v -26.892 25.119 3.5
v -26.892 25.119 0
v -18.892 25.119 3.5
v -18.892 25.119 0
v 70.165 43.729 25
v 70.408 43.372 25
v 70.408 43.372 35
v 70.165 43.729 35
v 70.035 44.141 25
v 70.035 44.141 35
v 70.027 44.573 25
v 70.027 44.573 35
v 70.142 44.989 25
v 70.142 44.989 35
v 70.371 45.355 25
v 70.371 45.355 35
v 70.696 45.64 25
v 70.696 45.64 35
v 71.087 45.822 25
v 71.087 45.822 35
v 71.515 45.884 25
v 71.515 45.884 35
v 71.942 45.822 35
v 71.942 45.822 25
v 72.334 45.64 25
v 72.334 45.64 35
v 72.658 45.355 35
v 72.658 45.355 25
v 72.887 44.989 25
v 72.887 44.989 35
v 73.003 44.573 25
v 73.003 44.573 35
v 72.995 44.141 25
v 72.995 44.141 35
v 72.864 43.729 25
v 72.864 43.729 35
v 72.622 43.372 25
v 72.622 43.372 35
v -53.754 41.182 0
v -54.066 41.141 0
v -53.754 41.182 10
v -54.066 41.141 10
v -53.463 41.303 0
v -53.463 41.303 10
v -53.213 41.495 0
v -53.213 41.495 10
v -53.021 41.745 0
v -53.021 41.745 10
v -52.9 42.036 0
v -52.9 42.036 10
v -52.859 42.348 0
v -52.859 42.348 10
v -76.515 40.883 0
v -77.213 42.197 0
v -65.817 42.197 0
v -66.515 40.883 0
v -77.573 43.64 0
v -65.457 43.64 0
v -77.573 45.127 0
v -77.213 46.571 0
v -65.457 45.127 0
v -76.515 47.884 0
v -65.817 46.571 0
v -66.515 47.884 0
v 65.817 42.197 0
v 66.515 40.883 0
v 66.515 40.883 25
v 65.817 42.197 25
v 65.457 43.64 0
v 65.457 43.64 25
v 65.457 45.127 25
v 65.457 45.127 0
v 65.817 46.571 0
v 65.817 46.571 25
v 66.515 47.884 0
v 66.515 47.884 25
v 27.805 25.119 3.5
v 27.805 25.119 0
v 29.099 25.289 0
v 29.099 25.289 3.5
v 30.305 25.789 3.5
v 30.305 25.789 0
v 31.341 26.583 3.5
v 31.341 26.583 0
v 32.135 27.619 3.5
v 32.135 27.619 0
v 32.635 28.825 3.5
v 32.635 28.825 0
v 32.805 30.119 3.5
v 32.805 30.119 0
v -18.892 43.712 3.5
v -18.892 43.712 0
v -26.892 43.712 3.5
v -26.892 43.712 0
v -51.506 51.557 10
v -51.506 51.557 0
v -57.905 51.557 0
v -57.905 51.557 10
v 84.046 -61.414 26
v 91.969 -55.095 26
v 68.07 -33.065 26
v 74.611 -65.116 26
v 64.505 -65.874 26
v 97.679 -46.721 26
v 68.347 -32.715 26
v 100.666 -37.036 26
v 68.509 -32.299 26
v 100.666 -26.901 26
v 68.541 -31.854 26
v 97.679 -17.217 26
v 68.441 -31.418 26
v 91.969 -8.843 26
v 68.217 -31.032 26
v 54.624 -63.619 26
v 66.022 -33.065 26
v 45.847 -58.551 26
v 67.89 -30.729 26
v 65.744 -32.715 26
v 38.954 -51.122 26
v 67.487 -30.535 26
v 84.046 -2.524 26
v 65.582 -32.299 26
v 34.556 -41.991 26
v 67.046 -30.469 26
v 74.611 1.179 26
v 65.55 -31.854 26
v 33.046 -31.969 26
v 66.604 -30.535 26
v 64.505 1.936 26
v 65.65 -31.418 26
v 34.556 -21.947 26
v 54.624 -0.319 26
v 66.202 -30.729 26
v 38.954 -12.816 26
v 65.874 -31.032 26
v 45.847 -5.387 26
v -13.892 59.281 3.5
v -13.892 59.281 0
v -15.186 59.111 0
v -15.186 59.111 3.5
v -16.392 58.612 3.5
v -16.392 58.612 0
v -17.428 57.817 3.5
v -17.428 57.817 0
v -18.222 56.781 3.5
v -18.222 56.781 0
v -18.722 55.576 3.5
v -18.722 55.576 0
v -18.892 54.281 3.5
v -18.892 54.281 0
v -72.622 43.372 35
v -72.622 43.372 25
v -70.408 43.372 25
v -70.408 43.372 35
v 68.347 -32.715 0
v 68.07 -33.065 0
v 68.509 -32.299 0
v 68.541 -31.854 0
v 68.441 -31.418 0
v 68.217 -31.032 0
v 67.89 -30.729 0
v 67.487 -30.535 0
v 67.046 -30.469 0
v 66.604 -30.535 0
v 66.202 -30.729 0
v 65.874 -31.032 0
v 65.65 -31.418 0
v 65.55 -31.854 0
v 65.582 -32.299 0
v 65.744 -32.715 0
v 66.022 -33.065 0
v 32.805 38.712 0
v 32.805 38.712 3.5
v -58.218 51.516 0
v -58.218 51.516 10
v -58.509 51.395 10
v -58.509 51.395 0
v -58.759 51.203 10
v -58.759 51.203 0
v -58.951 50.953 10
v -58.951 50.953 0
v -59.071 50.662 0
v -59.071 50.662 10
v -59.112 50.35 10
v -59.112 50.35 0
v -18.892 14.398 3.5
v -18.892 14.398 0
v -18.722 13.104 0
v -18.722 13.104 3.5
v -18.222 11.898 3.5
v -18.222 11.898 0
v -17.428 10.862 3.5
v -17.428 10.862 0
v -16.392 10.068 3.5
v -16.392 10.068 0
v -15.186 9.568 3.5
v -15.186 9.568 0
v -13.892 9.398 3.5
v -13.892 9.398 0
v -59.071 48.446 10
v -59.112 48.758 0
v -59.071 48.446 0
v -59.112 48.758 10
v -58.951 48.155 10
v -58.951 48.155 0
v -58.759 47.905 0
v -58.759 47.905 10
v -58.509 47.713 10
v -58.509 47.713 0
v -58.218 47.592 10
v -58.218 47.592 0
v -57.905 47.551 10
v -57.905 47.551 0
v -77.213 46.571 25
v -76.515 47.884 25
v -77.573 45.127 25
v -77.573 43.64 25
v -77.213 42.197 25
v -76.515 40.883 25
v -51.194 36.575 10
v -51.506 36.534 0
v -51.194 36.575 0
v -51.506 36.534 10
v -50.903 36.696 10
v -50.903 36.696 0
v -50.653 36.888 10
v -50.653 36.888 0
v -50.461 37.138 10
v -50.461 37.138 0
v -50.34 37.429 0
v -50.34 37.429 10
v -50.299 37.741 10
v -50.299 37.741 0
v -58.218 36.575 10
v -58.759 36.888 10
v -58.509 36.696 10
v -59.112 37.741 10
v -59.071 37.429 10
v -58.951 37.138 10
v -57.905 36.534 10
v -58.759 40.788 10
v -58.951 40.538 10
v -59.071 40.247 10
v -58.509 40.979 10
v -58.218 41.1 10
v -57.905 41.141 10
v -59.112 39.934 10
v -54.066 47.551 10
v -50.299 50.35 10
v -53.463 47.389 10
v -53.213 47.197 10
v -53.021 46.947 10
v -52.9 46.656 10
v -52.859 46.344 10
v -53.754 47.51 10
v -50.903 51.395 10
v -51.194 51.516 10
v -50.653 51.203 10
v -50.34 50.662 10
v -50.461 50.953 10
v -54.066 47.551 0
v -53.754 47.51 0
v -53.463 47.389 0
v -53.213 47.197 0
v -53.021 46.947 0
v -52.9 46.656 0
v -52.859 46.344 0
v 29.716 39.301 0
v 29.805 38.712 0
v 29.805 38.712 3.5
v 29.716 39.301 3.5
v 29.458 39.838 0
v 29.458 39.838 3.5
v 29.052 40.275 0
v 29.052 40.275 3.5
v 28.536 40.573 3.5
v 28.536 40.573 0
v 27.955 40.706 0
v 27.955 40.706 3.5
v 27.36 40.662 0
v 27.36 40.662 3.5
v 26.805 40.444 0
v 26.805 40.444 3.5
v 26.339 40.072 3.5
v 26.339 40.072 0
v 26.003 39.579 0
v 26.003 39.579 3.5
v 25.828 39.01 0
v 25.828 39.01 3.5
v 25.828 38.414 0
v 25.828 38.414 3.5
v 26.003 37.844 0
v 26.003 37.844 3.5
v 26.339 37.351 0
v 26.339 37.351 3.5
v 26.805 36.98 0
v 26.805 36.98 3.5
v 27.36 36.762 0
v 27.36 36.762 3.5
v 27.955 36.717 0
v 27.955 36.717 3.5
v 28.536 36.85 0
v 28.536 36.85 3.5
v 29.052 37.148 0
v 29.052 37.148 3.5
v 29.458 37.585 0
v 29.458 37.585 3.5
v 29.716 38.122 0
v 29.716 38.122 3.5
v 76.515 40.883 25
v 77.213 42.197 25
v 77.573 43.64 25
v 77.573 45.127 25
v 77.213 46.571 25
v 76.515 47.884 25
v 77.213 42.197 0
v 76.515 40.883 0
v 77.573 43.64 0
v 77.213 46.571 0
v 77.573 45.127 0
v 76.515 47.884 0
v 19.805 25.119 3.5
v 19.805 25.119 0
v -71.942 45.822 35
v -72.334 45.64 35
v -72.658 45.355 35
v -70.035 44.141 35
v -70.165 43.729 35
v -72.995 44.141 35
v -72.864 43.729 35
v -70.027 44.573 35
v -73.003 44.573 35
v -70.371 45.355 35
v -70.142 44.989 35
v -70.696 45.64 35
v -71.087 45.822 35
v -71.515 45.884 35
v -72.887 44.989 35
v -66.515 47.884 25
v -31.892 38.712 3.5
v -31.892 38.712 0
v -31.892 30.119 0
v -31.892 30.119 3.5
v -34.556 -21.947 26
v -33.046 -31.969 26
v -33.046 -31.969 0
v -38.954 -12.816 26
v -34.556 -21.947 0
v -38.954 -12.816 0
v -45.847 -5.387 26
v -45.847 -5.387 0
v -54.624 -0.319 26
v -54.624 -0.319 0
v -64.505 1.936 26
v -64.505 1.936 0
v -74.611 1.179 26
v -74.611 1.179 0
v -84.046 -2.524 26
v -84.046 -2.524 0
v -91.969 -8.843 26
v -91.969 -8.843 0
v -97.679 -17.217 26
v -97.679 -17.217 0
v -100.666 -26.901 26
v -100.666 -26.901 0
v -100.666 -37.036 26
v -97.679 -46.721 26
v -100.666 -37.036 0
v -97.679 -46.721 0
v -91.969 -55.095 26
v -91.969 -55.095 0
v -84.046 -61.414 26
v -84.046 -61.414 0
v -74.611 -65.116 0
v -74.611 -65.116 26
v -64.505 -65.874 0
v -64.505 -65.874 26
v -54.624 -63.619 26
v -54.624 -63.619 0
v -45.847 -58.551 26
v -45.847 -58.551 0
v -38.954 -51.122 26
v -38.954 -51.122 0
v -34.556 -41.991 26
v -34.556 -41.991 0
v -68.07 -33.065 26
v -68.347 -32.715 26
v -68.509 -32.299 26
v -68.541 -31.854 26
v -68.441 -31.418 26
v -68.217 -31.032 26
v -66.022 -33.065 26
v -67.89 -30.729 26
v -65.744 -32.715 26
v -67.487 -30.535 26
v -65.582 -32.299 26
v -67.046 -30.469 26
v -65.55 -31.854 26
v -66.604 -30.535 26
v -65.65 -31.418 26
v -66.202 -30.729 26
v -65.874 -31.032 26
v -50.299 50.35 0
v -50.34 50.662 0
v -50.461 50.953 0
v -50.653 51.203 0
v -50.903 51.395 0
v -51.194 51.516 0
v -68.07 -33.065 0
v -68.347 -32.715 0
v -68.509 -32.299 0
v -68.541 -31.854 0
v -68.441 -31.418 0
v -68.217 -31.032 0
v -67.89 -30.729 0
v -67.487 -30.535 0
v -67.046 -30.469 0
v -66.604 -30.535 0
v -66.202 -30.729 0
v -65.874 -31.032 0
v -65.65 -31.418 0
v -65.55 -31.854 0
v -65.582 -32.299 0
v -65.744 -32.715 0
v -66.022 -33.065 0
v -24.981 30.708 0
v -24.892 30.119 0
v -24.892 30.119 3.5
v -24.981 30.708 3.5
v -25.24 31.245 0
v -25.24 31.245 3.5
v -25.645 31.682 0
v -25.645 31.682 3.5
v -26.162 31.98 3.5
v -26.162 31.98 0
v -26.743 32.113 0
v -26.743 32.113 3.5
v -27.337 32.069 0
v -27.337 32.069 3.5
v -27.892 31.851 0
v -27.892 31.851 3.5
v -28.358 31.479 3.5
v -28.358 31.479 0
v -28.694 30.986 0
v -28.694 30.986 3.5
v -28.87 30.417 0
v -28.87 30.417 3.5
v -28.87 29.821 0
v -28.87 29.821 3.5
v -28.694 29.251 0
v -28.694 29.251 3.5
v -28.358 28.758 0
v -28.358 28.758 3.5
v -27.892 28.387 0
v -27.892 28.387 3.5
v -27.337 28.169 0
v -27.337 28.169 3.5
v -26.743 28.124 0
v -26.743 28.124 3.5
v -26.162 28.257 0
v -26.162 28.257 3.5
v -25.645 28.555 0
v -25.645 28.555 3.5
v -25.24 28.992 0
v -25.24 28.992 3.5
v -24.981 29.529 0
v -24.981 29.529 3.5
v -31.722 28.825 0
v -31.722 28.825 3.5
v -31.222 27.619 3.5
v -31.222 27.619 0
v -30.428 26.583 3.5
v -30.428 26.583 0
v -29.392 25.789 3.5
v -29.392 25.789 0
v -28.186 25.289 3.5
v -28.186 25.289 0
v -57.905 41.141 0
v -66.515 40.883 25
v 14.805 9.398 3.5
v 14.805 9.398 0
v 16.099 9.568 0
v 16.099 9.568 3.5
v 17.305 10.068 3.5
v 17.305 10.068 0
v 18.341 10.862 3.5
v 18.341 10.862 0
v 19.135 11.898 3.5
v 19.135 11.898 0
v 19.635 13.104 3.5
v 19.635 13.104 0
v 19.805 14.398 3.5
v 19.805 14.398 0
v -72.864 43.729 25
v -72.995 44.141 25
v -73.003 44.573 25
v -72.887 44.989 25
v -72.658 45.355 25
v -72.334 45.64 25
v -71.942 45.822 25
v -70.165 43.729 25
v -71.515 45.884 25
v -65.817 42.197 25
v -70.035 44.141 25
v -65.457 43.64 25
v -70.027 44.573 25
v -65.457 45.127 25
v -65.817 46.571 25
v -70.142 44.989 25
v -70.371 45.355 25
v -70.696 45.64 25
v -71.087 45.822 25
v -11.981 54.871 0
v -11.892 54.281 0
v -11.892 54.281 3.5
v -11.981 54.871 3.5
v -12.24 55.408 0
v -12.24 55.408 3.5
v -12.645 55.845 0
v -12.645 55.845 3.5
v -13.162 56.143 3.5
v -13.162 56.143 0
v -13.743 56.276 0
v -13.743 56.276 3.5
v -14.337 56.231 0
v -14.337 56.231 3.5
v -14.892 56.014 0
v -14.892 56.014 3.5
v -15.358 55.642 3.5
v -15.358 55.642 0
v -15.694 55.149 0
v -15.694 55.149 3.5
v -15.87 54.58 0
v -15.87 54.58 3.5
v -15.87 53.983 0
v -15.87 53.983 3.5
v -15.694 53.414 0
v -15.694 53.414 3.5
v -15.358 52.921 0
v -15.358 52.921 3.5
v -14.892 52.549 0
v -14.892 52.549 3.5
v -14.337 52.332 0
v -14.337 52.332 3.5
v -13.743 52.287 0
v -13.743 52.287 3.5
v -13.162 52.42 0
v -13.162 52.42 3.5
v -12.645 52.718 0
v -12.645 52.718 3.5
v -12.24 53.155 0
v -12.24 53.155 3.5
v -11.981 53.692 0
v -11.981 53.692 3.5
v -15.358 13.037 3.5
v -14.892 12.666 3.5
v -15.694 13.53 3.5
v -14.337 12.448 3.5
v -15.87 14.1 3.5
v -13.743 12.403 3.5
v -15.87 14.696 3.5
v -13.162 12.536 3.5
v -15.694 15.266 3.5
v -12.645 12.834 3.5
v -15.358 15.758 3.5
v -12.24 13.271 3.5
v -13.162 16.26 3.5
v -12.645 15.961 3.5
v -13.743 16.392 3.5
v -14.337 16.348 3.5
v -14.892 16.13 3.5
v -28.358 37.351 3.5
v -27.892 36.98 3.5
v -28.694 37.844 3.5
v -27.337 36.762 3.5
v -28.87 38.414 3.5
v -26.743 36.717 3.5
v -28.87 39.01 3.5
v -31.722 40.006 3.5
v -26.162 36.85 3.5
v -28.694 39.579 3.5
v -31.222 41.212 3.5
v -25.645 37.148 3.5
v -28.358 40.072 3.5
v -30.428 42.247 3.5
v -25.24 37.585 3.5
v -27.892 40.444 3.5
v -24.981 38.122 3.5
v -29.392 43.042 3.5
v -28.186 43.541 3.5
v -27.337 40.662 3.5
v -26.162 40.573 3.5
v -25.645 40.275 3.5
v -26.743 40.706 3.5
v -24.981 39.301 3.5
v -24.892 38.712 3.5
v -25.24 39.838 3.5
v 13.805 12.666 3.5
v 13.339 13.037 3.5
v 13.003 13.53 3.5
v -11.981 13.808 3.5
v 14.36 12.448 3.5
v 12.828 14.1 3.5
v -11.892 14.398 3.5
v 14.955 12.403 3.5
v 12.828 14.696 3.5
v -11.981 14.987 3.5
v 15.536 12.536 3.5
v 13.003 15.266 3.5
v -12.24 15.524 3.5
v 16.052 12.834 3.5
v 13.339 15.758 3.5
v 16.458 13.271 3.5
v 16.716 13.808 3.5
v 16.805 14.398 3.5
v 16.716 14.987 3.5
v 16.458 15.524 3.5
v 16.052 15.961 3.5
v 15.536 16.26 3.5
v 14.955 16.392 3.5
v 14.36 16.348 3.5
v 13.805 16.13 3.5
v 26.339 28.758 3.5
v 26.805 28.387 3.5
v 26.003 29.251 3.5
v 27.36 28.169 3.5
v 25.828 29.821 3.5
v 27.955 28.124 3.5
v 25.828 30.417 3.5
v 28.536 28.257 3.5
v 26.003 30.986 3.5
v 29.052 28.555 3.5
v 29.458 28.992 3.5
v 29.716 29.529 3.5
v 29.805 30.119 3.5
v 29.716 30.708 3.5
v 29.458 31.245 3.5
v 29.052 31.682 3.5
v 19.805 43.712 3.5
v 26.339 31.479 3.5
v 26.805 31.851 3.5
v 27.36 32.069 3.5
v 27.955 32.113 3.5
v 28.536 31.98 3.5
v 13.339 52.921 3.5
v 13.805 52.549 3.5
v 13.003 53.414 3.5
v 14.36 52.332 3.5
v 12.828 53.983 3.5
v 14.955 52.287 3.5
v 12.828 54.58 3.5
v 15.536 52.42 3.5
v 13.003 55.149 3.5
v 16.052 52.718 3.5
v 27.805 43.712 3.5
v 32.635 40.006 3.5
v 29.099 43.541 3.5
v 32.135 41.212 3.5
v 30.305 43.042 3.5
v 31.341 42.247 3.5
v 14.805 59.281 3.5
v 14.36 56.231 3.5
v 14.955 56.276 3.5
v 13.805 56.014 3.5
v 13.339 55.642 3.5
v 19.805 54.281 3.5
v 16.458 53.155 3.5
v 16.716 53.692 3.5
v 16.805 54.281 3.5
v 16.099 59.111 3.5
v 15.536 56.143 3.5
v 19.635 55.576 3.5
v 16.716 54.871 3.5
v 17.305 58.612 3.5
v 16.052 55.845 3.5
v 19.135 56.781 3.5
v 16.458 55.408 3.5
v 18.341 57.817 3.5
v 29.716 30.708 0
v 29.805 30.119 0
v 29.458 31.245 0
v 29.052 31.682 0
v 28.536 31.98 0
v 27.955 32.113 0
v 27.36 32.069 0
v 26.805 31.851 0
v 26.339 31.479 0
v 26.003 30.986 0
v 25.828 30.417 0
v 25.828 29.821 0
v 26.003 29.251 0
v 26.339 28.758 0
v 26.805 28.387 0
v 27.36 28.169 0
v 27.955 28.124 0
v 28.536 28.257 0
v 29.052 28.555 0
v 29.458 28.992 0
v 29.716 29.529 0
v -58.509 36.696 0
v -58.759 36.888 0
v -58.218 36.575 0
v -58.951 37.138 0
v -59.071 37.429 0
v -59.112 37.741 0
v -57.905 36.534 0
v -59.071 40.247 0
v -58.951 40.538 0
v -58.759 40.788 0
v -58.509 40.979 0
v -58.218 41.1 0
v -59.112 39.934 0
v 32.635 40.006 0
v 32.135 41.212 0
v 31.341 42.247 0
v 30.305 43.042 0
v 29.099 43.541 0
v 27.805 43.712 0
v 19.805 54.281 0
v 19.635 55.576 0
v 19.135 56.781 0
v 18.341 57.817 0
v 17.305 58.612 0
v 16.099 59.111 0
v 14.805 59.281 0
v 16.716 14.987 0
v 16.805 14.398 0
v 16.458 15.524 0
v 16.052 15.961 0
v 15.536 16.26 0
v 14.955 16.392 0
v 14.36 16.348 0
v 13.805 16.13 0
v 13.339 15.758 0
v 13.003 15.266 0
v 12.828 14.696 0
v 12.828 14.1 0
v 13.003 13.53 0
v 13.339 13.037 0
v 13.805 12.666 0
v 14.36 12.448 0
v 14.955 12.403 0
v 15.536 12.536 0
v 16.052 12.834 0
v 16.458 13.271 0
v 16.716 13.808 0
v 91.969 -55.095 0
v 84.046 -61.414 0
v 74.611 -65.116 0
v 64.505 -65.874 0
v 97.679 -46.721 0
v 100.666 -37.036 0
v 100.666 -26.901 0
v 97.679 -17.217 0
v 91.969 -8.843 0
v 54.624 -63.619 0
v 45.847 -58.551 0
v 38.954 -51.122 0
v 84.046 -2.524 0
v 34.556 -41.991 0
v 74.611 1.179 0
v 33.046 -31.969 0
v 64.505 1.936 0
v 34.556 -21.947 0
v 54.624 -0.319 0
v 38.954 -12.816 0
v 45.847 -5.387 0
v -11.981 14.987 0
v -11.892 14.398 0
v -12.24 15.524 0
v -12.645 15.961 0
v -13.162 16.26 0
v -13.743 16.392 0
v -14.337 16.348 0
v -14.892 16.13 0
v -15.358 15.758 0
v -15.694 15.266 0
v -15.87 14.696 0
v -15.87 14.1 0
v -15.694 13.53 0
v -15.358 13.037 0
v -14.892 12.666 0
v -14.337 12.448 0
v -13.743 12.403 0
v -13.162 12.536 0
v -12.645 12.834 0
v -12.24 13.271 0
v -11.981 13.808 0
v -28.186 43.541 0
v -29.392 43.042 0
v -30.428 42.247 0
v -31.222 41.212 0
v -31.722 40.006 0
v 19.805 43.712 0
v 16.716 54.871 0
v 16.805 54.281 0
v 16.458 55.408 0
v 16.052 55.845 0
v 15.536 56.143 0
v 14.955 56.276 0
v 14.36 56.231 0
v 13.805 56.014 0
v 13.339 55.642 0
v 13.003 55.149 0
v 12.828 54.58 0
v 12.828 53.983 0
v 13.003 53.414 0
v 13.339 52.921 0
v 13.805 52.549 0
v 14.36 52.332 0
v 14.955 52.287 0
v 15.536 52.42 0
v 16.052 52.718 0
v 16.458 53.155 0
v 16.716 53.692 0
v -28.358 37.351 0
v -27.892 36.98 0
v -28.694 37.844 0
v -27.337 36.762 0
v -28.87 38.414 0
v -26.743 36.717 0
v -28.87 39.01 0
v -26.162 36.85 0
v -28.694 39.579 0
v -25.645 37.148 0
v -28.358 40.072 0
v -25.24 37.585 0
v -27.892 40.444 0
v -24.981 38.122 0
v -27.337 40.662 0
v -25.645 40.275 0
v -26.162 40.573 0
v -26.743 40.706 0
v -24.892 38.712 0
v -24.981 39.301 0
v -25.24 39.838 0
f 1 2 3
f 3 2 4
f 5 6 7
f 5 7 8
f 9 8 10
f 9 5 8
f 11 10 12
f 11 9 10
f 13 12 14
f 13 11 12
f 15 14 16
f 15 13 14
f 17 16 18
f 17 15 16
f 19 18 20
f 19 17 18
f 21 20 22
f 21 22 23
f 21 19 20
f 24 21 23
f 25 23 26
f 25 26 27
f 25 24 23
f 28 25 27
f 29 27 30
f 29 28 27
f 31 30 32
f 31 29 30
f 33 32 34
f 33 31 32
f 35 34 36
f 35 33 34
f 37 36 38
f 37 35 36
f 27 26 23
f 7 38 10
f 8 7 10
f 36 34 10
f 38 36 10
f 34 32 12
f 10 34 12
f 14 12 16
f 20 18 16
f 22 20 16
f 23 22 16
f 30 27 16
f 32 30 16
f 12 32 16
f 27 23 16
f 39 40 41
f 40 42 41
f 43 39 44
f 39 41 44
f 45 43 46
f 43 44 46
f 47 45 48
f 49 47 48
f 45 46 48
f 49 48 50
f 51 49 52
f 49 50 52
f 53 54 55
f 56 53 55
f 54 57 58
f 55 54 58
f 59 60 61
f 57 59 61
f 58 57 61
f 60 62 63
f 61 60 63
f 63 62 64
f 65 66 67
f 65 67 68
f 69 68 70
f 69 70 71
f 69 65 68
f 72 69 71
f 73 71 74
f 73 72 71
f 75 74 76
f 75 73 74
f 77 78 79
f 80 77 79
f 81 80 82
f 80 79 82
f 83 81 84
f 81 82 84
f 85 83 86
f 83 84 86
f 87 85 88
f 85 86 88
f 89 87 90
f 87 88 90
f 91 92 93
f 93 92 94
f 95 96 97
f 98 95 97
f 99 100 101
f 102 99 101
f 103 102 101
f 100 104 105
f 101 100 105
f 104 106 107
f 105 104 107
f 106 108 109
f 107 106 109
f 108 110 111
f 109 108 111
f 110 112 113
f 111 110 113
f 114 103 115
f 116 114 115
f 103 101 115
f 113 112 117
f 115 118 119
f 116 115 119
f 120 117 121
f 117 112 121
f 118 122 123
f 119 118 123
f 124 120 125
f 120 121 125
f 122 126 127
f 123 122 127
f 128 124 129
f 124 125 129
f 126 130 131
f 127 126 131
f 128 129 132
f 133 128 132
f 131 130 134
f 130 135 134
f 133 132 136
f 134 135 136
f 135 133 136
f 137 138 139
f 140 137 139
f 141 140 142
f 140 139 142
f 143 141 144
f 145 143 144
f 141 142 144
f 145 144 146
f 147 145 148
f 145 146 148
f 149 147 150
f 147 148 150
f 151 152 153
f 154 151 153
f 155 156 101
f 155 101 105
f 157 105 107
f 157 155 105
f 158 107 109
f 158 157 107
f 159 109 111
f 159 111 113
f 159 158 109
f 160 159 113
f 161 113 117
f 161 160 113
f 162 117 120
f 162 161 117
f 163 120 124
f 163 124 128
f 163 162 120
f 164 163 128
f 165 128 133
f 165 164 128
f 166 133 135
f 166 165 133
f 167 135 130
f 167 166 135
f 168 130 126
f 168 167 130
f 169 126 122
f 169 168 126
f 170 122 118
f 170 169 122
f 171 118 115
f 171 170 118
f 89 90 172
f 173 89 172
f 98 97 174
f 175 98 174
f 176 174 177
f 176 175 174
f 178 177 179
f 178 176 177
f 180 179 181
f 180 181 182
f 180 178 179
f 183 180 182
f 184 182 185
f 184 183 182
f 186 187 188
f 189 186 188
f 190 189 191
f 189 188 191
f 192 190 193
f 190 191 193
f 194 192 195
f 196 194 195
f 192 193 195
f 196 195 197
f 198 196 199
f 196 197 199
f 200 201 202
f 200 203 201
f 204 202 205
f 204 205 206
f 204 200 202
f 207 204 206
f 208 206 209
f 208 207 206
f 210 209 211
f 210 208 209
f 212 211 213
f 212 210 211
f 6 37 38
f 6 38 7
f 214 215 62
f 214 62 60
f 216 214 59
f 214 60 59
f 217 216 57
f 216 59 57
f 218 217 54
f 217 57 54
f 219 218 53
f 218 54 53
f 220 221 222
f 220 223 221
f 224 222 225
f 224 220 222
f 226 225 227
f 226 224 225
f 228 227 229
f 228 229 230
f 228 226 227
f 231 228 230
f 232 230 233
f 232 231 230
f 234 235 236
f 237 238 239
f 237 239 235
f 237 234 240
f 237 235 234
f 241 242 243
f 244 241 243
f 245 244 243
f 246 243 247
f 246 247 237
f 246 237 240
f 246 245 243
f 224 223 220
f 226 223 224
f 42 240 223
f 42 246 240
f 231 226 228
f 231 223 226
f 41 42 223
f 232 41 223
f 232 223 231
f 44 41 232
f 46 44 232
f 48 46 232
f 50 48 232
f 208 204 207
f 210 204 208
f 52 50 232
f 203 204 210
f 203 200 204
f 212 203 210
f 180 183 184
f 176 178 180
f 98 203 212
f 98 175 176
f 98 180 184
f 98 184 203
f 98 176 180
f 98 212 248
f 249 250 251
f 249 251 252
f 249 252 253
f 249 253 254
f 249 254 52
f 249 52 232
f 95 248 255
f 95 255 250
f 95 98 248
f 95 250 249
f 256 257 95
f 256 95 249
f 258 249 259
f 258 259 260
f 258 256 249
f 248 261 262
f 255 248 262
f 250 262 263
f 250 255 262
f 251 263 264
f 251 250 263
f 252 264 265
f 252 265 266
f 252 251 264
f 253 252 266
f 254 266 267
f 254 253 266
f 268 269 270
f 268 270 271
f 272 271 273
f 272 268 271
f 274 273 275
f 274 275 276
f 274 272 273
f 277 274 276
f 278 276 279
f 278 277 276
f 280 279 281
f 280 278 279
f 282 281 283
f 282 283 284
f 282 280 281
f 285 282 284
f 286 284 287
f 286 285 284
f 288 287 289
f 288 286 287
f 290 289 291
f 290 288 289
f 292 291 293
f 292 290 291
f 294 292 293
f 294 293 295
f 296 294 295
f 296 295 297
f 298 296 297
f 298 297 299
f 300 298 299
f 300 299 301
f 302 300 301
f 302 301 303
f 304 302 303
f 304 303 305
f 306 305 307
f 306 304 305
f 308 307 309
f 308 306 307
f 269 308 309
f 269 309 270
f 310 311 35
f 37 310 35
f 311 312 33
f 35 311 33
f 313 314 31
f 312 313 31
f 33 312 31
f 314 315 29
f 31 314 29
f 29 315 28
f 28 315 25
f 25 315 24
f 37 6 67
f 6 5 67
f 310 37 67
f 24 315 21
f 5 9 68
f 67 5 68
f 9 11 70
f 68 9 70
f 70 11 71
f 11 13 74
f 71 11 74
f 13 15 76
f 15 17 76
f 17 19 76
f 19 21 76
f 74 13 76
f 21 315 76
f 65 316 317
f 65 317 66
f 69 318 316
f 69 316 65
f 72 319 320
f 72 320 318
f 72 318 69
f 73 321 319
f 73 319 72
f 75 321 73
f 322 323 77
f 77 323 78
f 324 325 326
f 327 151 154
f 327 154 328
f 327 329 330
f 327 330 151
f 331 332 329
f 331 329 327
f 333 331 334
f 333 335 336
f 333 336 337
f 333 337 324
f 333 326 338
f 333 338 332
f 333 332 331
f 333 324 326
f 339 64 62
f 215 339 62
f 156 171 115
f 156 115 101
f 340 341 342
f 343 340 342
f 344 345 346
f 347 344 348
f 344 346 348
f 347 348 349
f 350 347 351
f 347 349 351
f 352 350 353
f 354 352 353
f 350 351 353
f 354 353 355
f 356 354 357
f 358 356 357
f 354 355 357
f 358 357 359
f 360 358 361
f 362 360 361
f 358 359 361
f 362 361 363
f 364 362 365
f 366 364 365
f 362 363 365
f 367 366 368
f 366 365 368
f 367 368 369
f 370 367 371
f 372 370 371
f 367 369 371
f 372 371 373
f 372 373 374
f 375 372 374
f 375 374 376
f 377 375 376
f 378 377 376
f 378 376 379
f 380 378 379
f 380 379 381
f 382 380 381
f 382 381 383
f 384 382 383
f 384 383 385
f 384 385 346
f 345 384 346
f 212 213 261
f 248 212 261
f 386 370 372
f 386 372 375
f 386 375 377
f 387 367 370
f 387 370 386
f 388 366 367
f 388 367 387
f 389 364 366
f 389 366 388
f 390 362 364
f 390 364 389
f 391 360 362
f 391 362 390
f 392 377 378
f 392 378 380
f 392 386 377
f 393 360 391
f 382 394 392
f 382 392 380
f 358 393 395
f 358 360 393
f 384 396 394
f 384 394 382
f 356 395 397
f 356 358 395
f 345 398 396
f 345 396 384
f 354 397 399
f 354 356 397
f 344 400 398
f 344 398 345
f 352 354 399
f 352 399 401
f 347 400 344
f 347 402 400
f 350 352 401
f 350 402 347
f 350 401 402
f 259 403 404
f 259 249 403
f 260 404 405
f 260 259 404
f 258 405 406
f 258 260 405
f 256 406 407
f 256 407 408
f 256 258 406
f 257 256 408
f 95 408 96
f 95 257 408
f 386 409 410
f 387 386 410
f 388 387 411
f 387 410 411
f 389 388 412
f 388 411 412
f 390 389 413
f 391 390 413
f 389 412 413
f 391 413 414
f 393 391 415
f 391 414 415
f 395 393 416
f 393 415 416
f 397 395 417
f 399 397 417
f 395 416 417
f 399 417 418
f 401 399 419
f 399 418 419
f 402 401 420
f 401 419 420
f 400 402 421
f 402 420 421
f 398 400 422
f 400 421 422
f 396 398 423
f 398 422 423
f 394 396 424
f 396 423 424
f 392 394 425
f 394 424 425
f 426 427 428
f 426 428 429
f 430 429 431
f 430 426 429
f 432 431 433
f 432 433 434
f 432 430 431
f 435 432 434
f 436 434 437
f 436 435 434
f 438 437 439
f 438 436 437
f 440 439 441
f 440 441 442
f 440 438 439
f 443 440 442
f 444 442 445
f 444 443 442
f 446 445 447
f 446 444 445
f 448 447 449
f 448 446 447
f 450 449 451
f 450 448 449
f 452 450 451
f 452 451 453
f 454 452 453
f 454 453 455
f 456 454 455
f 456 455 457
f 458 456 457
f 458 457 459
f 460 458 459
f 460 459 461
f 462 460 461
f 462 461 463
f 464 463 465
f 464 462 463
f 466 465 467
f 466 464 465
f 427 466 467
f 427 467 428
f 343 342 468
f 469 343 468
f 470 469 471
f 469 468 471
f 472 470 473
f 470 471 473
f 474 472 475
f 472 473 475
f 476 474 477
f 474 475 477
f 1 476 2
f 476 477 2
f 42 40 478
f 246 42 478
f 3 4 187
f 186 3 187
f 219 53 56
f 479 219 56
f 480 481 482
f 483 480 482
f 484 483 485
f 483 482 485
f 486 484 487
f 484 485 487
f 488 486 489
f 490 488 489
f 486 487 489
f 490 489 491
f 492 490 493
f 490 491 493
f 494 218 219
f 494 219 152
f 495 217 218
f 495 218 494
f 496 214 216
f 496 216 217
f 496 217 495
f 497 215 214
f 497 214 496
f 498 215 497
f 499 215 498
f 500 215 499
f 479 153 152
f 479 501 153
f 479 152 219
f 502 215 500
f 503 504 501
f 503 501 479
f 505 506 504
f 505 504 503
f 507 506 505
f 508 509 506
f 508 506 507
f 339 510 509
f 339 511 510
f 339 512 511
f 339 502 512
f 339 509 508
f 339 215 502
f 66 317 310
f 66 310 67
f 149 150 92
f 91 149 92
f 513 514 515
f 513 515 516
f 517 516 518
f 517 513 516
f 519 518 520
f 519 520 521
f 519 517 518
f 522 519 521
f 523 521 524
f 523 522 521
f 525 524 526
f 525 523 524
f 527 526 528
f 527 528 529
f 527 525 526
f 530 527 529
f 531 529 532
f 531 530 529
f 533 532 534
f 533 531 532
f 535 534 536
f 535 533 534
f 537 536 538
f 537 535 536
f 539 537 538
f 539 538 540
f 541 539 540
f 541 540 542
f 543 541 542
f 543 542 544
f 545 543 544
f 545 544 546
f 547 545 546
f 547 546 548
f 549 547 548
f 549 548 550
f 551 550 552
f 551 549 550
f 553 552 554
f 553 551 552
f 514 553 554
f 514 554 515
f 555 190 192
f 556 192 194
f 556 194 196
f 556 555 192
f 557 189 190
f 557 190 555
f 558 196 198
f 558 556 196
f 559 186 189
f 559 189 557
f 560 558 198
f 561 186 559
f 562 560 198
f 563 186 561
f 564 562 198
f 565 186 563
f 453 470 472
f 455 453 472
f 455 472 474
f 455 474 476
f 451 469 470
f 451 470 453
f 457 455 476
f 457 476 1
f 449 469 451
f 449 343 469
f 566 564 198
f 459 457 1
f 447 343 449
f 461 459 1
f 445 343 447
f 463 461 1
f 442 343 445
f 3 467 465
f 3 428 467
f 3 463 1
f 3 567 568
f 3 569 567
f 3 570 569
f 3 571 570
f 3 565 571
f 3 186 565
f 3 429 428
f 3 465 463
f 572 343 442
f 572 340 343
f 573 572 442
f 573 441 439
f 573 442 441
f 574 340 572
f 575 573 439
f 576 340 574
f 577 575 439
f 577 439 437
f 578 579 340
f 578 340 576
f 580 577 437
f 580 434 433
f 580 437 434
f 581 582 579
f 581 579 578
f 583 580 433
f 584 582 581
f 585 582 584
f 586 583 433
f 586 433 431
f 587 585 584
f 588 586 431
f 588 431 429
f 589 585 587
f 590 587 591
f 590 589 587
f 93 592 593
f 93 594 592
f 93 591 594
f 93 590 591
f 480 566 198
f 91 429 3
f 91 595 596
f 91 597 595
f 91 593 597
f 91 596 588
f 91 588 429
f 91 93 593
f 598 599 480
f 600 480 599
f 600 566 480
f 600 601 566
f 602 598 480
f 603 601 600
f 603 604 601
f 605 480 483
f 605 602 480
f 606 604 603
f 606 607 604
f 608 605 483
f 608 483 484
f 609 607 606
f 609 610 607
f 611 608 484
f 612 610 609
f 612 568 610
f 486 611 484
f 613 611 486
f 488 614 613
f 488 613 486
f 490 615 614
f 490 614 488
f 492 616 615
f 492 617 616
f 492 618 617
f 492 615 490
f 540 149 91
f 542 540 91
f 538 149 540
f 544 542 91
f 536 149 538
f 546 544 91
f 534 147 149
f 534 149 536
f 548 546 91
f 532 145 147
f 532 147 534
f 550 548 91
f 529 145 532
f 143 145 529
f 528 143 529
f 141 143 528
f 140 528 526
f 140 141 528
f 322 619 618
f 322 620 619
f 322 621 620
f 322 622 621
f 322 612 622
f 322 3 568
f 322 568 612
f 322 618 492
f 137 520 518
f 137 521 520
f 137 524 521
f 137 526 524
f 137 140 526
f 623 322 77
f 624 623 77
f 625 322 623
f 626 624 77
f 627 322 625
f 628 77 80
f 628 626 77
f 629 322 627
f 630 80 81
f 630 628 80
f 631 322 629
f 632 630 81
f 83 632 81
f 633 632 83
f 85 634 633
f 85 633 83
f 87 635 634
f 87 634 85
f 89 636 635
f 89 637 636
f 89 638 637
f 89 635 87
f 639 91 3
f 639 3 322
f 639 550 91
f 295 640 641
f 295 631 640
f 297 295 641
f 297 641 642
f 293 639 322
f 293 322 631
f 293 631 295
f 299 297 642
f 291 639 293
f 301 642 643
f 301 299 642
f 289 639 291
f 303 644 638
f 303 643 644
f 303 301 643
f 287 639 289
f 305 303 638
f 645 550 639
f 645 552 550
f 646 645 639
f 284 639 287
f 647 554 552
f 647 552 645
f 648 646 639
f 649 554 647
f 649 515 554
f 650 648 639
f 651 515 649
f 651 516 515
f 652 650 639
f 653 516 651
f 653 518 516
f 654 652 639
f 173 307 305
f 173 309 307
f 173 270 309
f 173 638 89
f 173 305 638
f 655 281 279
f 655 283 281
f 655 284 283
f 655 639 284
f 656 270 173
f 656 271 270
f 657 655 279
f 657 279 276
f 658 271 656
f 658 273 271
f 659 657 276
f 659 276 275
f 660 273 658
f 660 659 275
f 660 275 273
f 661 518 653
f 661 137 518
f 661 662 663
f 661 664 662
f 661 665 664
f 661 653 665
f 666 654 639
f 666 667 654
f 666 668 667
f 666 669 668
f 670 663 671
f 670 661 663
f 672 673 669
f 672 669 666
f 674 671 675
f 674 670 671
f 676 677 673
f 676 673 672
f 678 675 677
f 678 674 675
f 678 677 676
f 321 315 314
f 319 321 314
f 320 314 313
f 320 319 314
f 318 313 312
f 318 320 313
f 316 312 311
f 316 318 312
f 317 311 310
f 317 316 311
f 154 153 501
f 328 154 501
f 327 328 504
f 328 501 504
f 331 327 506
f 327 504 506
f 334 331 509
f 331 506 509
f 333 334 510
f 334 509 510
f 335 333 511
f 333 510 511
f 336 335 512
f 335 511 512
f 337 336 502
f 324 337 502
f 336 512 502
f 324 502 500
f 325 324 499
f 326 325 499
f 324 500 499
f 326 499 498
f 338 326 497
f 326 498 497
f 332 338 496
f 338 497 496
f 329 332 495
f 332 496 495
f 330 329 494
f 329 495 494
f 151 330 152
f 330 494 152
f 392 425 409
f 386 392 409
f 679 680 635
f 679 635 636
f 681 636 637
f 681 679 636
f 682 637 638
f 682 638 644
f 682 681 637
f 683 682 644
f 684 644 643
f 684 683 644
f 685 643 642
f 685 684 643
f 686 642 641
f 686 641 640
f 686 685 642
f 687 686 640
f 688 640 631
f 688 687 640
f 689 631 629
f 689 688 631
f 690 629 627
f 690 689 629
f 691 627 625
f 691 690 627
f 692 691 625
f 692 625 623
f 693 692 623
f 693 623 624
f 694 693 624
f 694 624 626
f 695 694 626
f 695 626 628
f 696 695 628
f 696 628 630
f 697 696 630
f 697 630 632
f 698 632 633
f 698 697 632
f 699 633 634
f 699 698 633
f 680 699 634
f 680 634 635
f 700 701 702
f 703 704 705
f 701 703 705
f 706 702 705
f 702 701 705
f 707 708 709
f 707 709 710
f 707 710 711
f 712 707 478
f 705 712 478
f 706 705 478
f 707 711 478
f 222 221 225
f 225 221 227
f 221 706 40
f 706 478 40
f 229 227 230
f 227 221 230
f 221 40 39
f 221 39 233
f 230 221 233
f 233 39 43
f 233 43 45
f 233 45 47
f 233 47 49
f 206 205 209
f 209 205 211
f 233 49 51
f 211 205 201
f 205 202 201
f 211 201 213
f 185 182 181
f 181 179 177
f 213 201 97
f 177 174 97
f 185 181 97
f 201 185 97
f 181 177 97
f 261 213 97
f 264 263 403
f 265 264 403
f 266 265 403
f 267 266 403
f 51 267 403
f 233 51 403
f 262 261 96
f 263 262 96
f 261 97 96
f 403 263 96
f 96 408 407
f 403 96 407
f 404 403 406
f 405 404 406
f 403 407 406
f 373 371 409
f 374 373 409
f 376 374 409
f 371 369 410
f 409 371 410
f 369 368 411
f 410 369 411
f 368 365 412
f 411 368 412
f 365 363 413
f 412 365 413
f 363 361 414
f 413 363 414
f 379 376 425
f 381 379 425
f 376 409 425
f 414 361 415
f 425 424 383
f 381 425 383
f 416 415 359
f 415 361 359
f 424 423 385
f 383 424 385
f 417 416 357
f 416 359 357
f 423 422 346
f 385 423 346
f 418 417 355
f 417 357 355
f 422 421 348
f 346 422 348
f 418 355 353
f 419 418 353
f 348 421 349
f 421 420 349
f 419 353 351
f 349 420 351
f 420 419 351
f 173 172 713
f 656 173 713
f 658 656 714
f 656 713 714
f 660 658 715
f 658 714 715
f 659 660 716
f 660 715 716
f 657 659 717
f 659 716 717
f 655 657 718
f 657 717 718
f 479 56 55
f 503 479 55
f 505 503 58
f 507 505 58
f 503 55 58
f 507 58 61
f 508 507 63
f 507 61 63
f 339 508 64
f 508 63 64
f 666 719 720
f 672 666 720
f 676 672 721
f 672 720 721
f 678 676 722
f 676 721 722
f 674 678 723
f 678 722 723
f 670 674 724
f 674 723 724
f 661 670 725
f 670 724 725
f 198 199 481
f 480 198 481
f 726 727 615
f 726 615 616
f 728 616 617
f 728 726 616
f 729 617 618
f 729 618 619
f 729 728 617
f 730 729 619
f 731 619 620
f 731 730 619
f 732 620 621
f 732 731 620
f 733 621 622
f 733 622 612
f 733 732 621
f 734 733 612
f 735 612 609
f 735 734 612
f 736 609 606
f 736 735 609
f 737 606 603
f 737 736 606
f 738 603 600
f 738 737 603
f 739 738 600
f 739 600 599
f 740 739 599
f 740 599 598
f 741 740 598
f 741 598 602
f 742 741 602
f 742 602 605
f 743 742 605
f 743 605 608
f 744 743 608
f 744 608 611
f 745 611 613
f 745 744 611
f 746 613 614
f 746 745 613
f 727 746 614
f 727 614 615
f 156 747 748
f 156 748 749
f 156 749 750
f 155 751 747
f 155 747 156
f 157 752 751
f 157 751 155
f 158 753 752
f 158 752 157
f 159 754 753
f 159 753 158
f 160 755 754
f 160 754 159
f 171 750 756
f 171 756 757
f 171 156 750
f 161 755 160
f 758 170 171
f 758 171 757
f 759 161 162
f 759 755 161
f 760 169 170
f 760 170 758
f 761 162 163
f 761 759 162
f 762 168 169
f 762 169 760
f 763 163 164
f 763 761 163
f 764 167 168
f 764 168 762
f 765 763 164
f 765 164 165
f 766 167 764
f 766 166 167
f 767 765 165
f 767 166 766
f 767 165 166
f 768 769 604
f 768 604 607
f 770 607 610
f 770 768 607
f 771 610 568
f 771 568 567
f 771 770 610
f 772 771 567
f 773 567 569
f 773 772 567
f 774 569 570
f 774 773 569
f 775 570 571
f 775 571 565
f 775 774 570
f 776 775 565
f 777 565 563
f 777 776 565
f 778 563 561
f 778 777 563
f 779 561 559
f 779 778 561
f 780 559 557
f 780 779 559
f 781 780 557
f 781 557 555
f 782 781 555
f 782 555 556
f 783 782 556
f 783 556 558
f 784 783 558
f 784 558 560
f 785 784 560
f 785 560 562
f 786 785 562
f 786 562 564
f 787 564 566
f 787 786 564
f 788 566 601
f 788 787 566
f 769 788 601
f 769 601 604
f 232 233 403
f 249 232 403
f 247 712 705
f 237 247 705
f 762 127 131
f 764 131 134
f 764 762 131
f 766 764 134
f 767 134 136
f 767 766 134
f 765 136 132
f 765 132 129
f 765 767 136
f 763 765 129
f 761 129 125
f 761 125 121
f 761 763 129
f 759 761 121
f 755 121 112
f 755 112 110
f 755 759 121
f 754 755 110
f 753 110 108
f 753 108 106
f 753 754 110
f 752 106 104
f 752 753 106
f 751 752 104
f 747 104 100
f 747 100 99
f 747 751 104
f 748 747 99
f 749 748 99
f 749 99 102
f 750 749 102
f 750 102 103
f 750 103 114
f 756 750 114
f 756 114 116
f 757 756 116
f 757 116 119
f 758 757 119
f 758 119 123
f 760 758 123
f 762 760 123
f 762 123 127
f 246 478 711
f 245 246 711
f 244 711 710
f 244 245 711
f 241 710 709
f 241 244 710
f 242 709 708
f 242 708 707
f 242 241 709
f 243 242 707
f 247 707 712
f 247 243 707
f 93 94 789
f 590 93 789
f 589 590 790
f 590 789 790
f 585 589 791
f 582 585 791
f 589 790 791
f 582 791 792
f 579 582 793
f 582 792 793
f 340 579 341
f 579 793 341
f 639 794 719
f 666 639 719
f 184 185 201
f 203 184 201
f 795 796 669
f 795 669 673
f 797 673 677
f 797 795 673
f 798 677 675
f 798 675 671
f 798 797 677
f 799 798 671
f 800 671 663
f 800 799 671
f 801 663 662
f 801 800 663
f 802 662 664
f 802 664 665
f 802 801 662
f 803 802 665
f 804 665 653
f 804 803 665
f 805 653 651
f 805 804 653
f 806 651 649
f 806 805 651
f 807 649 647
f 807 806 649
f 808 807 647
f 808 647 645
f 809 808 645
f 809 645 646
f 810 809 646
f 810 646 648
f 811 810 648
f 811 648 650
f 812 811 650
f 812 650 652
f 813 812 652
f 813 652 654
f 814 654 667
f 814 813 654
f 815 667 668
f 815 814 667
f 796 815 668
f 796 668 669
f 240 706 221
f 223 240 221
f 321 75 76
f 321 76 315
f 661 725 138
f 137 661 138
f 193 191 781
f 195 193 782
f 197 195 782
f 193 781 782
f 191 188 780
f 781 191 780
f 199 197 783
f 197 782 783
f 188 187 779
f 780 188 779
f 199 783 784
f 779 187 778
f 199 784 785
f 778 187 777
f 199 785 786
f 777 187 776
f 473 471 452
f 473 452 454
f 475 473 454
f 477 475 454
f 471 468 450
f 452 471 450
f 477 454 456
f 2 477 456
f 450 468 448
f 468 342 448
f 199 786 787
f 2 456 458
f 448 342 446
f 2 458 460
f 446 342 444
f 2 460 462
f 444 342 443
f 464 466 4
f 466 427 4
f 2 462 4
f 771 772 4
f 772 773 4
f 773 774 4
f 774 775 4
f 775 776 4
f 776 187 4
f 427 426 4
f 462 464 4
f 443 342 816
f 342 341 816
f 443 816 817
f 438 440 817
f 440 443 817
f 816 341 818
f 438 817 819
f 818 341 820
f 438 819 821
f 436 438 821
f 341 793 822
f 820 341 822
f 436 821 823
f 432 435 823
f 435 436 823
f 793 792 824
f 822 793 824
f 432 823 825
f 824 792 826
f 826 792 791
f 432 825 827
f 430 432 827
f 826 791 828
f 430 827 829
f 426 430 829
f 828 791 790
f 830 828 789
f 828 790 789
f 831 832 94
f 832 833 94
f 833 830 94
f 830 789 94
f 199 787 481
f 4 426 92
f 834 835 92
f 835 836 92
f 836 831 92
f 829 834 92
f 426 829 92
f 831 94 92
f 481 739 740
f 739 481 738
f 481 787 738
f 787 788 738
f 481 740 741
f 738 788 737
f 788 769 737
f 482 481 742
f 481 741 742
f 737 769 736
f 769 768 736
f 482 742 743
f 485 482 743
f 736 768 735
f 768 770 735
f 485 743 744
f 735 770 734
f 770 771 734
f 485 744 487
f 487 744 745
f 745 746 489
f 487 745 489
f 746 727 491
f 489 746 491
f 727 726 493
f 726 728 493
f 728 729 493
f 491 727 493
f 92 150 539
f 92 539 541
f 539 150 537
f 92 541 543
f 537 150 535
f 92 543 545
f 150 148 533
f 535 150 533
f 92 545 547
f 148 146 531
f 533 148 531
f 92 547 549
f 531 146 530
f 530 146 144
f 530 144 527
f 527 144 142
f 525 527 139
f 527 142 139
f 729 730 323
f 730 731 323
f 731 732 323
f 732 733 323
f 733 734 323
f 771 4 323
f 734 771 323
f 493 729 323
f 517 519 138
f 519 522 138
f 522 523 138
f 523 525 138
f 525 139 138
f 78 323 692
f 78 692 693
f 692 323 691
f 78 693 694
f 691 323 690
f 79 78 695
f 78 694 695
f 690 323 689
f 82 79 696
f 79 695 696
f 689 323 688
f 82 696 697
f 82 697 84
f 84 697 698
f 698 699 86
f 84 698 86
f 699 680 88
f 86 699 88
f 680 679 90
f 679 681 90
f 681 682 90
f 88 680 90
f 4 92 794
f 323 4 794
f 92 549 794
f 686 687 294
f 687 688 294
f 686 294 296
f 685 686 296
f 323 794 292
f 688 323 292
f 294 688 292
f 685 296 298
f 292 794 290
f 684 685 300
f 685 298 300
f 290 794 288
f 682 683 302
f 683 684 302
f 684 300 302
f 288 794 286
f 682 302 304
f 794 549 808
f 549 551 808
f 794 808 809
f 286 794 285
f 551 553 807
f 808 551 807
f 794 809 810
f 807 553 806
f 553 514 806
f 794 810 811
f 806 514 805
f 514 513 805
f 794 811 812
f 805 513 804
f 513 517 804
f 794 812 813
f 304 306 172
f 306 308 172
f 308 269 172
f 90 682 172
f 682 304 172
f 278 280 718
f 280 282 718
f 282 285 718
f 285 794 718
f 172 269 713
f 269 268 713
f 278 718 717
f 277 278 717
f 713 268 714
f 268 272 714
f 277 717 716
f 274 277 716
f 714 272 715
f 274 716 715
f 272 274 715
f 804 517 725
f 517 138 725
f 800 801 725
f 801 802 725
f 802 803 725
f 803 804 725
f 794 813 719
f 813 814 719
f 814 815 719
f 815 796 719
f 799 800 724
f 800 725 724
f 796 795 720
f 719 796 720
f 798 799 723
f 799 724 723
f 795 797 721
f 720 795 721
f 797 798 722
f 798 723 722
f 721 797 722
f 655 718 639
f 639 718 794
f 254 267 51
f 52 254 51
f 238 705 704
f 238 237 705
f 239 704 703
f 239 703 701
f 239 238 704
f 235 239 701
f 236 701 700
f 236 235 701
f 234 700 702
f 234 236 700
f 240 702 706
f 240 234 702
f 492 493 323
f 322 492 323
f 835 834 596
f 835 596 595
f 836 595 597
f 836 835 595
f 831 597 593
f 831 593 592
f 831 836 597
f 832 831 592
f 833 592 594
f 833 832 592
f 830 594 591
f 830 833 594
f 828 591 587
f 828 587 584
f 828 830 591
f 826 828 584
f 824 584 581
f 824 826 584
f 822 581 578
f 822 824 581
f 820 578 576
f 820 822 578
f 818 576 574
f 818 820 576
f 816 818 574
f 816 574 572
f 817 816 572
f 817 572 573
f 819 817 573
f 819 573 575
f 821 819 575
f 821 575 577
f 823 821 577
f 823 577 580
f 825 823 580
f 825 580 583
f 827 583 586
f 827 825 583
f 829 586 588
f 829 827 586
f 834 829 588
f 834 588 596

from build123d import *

# Parameters (mm, degrees)
F0_R      = 34
F1_DEPTH  = 26
F2_DEPTH  = 25
F4_DEPTH  = 25
F6_DEPTH  = 10
F9_DEPTH  = 10
F10_R     = 1.207107
F11_R     = 2
F12_DEPTH = 3.5


with BuildPart() as f1:
    # F0 (on Top) → F1 (new body)
    with BuildSketch(Plane.XY):
        with Locations((-67.045674, -31.968914)):
            Circle(F0_R)
        with BuildLine():
            ThreePointArc((-68.069792, -33.064898), (-67.045674, -30.468914), (-66.021555, -33.064898))
            Line((-66.021555, -33.064898), (-68.069792, -33.064898))
        make_face(mode=Mode.SUBTRACT)
    extrude(amount=F1_DEPTH)

    # F0 (on Top) → F2 (join)
    with BuildSketch(Plane.XY):
        with Locations((-67.045674, -31.968914)):
            Circle(F0_R)
        with BuildLine():
            ThreePointArc((-68.069792, -33.064898), (-67.045674, -30.468914), (-66.021555, -33.064898))
            Line((-66.021555, -33.064898), (-68.069792, -33.064898))
        make_face(mode=Mode.SUBTRACT)
    extrude(amount=F2_DEPTH)


with BuildPart() as f4:
    # F3 (on Top) → F4 (new body)
    with BuildSketch(Plane.XY):
        with BuildLine():
            Line((-66.514805, 47.884089), (-76.514805, 47.884089))
            ThreePointArc((-76.514805, 47.884089), (-77.618305, 44.383701), (-76.514805, 40.883314))
            Line((-76.514805, 40.883314), (-66.514805, 40.883314))
            ThreePointArc((-66.514805, 40.883314), (-65.411305, 44.383701), (-66.514805, 47.884089))
        make_face()
    extrude(amount=F4_DEPTH)

    # F5 (on face) → F6 (join)
    with BuildSketch(Plane.XY.offset(25)):
        with BuildLine():
            Line((-72.622018, 43.371733), (-70.407592, 43.371733))
            ThreePointArc((-70.407592, 43.371733), (-71.514805, 45.883701), (-72.622018, 43.371733))
        make_face()
    extrude(amount=F6_DEPTH)


with BuildPart() as f7_1:
    # F7: instance of F4
    add(f4.part.mirror(Plane.YZ))


with BuildPart() as f7_2:
    # F7: instance of F1
    add(f1.part.mirror(Plane.YZ))


with BuildPart() as f9:
    # F8 (on Top) → F9 (new body)
    with BuildSketch(Plane.XY):
        Polygon((-52.858956, 41.141208), (-59.112478, 41.141208), (-59.112478, 36.534205), (-50.299078, 36.534205), (-50.299078, 51.557045), (-59.112478, 51.557045), (-59.112478, 47.550954), (-52.858956, 47.550954), align=None)
    extrude(amount=F9_DEPTH)

    # F10
    f10_edges = [f9.edges().sort_by_distance(p)[0] for p in [
        (-59.112478, 47.550954, 5),
        (-59.112478, 41.141208, 5),
        (-52.858956, 47.550954, 5),
        (-52.858956, 41.141208, 5),
        (-50.299078, 51.557045, 5),
        (-59.112478, 51.557045, 5),
        (-50.299078, 36.534205, 5),
        (-59.112478, 36.534205, 5),
    ]]
    fillet(f10_edges, radius=F10_R)


with BuildPart() as f12:
    # F11 (on Top) → F12 (new body)
    with BuildSketch(Plane.XY):
        with BuildLine():
            ThreePointArc((-18.892364, 14.397767), (-17.427898, 10.862233), (-13.892364, 9.397767))
            Line((-13.892364, 9.397767), (14.805313, 9.397767))
            ThreePointArc((14.805313, 9.397767), (18.340847, 10.862233), (19.805313, 14.397767))
            Line((19.805313, 14.397767), (19.805313, 25.118697))
            Line((19.805313, 25.118697), (27.805313, 25.118697))
            ThreePointArc((27.805313, 25.118697), (31.340847, 26.583163), (32.805313, 30.118697))
            Line((32.805313, 30.118697), (32.805313, 38.711721))
            ThreePointArc((32.805313, 38.711721), (31.340847, 42.247255), (27.805313, 43.711721))
            Line((27.805313, 43.711721), (19.805313, 43.711721))
            Line((19.805313, 43.711721), (19.805313, 54.28149))
            ThreePointArc((19.805313, 54.28149), (18.340847, 57.817024), (14.805313, 59.28149))
            Line((14.805313, 59.28149), (-13.892364, 59.28149))
            ThreePointArc((-13.892364, 59.28149), (-17.427898, 57.817024), (-18.892364, 54.28149))
            Line((-18.892364, 54.28149), (-18.892364, 43.711721))
            Line((-18.892364, 43.711721), (-26.892364, 43.711721))
            ThreePointArc((-26.892364, 43.711721), (-30.427898, 42.247255), (-31.892364, 38.711721))
            Line((-31.892364, 38.711721), (-31.892364, 30.118697))
            ThreePointArc((-31.892364, 30.118697), (-30.427898, 26.583163), (-26.892364, 25.118697))
            Line((-26.892364, 25.118697), (-18.892364, 25.118697))
            Line((-18.892364, 25.118697), (-18.892364, 14.397767))
        make_face()
        with Locations((-13.892364, 14.397767)):
            Circle(F11_R, mode=Mode.SUBTRACT)
        with Locations((-26.892364, 30.118697)):
            Circle(F11_R, mode=Mode.SUBTRACT)
        with Locations((14.805313, 14.397767)):
            Circle(F11_R, mode=Mode.SUBTRACT)
        with Locations((27.805313, 30.118697)):
            Circle(F11_R, mode=Mode.SUBTRACT)
        with Locations((-26.892364, 38.711721)):
            Circle(F11_R, mode=Mode.SUBTRACT)
        with Locations((-13.892364, 54.28149)):
            Circle(F11_R, mode=Mode.SUBTRACT)
        with Locations((27.805313, 38.711721)):
            Circle(F11_R, mode=Mode.SUBTRACT)
        with Locations((14.805313, 54.28149)):
            Circle(F11_R, mode=Mode.SUBTRACT)
    extrude(amount=F12_DEPTH)


solid = Compound([f1.part, f4.part, f7_1.part, f7_2.part, f9.part, f12.part])
